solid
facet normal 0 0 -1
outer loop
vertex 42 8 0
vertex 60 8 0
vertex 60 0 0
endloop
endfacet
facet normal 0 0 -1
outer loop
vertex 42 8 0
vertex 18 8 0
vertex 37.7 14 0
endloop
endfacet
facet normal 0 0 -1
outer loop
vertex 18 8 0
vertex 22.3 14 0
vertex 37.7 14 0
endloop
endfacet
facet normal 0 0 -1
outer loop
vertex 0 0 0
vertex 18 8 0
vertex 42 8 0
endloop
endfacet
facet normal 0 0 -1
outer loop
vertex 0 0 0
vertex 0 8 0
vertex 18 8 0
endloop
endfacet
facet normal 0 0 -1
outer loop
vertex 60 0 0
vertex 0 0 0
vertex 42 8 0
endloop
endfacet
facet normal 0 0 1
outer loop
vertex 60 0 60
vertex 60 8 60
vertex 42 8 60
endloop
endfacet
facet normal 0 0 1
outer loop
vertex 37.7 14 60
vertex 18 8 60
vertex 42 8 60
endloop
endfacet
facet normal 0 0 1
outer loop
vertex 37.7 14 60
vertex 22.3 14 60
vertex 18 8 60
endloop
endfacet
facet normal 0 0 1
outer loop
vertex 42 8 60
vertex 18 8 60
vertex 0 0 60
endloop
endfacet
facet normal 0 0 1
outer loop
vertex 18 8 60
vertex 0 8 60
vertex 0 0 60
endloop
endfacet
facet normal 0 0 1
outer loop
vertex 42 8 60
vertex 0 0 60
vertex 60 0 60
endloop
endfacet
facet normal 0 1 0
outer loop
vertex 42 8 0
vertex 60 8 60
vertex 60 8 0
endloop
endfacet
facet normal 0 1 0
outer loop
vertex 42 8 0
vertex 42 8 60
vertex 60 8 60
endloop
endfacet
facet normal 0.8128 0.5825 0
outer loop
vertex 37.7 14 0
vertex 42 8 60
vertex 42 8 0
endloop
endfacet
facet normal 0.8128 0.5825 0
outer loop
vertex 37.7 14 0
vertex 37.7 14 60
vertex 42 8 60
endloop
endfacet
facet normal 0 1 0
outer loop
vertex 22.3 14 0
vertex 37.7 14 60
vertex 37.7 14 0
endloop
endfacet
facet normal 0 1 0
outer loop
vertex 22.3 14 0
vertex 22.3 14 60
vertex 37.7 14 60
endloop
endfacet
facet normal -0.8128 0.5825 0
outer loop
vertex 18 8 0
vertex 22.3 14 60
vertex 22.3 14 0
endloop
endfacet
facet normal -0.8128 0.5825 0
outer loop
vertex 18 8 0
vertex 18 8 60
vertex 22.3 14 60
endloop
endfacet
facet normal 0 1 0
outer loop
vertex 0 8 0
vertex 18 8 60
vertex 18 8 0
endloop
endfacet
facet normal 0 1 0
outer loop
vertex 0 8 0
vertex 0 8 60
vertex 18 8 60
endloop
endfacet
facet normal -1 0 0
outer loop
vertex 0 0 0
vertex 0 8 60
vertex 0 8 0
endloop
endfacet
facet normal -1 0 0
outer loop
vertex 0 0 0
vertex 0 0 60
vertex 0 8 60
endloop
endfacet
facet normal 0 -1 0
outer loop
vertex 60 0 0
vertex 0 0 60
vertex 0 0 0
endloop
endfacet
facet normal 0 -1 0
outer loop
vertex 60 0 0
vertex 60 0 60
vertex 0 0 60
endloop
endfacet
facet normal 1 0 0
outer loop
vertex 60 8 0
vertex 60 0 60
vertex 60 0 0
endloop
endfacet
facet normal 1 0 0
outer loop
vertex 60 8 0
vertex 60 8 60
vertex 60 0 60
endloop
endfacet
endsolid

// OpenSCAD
$fn = 32;

// ----------------------------------------------------------------------
// V guide rail: dovetail, 60 mm wide
// ----------------------------------------------------------------------

// --- parameters (mm) ---
rail_w = 60;              // rail width, X
base_t = 8;               // base plate thickness
v_depth = 6;              // V feature depth / height
v_half_w = 12;            // half width of the V at the base face
plate_t = 60;             // rail length, Z (the extrusion height)
top_half_w = 7.7;         // half width at the dovetail top

dovetail_base = 2 * v_half_w;  // dovetail width at the base
dovetail_top = 2 * top_half_w;  // dovetail width at the top

profile = [[0, 0], [60, 0], [60, 8], [42, 8], [37.7, 14], [22.3, 14], [18, 8], [0, 8]];  // primary outline, 8 points, counter clockwise

// --- the one profile operation ---
linear_extrude(height = plate_t) polygon(points = profile);
